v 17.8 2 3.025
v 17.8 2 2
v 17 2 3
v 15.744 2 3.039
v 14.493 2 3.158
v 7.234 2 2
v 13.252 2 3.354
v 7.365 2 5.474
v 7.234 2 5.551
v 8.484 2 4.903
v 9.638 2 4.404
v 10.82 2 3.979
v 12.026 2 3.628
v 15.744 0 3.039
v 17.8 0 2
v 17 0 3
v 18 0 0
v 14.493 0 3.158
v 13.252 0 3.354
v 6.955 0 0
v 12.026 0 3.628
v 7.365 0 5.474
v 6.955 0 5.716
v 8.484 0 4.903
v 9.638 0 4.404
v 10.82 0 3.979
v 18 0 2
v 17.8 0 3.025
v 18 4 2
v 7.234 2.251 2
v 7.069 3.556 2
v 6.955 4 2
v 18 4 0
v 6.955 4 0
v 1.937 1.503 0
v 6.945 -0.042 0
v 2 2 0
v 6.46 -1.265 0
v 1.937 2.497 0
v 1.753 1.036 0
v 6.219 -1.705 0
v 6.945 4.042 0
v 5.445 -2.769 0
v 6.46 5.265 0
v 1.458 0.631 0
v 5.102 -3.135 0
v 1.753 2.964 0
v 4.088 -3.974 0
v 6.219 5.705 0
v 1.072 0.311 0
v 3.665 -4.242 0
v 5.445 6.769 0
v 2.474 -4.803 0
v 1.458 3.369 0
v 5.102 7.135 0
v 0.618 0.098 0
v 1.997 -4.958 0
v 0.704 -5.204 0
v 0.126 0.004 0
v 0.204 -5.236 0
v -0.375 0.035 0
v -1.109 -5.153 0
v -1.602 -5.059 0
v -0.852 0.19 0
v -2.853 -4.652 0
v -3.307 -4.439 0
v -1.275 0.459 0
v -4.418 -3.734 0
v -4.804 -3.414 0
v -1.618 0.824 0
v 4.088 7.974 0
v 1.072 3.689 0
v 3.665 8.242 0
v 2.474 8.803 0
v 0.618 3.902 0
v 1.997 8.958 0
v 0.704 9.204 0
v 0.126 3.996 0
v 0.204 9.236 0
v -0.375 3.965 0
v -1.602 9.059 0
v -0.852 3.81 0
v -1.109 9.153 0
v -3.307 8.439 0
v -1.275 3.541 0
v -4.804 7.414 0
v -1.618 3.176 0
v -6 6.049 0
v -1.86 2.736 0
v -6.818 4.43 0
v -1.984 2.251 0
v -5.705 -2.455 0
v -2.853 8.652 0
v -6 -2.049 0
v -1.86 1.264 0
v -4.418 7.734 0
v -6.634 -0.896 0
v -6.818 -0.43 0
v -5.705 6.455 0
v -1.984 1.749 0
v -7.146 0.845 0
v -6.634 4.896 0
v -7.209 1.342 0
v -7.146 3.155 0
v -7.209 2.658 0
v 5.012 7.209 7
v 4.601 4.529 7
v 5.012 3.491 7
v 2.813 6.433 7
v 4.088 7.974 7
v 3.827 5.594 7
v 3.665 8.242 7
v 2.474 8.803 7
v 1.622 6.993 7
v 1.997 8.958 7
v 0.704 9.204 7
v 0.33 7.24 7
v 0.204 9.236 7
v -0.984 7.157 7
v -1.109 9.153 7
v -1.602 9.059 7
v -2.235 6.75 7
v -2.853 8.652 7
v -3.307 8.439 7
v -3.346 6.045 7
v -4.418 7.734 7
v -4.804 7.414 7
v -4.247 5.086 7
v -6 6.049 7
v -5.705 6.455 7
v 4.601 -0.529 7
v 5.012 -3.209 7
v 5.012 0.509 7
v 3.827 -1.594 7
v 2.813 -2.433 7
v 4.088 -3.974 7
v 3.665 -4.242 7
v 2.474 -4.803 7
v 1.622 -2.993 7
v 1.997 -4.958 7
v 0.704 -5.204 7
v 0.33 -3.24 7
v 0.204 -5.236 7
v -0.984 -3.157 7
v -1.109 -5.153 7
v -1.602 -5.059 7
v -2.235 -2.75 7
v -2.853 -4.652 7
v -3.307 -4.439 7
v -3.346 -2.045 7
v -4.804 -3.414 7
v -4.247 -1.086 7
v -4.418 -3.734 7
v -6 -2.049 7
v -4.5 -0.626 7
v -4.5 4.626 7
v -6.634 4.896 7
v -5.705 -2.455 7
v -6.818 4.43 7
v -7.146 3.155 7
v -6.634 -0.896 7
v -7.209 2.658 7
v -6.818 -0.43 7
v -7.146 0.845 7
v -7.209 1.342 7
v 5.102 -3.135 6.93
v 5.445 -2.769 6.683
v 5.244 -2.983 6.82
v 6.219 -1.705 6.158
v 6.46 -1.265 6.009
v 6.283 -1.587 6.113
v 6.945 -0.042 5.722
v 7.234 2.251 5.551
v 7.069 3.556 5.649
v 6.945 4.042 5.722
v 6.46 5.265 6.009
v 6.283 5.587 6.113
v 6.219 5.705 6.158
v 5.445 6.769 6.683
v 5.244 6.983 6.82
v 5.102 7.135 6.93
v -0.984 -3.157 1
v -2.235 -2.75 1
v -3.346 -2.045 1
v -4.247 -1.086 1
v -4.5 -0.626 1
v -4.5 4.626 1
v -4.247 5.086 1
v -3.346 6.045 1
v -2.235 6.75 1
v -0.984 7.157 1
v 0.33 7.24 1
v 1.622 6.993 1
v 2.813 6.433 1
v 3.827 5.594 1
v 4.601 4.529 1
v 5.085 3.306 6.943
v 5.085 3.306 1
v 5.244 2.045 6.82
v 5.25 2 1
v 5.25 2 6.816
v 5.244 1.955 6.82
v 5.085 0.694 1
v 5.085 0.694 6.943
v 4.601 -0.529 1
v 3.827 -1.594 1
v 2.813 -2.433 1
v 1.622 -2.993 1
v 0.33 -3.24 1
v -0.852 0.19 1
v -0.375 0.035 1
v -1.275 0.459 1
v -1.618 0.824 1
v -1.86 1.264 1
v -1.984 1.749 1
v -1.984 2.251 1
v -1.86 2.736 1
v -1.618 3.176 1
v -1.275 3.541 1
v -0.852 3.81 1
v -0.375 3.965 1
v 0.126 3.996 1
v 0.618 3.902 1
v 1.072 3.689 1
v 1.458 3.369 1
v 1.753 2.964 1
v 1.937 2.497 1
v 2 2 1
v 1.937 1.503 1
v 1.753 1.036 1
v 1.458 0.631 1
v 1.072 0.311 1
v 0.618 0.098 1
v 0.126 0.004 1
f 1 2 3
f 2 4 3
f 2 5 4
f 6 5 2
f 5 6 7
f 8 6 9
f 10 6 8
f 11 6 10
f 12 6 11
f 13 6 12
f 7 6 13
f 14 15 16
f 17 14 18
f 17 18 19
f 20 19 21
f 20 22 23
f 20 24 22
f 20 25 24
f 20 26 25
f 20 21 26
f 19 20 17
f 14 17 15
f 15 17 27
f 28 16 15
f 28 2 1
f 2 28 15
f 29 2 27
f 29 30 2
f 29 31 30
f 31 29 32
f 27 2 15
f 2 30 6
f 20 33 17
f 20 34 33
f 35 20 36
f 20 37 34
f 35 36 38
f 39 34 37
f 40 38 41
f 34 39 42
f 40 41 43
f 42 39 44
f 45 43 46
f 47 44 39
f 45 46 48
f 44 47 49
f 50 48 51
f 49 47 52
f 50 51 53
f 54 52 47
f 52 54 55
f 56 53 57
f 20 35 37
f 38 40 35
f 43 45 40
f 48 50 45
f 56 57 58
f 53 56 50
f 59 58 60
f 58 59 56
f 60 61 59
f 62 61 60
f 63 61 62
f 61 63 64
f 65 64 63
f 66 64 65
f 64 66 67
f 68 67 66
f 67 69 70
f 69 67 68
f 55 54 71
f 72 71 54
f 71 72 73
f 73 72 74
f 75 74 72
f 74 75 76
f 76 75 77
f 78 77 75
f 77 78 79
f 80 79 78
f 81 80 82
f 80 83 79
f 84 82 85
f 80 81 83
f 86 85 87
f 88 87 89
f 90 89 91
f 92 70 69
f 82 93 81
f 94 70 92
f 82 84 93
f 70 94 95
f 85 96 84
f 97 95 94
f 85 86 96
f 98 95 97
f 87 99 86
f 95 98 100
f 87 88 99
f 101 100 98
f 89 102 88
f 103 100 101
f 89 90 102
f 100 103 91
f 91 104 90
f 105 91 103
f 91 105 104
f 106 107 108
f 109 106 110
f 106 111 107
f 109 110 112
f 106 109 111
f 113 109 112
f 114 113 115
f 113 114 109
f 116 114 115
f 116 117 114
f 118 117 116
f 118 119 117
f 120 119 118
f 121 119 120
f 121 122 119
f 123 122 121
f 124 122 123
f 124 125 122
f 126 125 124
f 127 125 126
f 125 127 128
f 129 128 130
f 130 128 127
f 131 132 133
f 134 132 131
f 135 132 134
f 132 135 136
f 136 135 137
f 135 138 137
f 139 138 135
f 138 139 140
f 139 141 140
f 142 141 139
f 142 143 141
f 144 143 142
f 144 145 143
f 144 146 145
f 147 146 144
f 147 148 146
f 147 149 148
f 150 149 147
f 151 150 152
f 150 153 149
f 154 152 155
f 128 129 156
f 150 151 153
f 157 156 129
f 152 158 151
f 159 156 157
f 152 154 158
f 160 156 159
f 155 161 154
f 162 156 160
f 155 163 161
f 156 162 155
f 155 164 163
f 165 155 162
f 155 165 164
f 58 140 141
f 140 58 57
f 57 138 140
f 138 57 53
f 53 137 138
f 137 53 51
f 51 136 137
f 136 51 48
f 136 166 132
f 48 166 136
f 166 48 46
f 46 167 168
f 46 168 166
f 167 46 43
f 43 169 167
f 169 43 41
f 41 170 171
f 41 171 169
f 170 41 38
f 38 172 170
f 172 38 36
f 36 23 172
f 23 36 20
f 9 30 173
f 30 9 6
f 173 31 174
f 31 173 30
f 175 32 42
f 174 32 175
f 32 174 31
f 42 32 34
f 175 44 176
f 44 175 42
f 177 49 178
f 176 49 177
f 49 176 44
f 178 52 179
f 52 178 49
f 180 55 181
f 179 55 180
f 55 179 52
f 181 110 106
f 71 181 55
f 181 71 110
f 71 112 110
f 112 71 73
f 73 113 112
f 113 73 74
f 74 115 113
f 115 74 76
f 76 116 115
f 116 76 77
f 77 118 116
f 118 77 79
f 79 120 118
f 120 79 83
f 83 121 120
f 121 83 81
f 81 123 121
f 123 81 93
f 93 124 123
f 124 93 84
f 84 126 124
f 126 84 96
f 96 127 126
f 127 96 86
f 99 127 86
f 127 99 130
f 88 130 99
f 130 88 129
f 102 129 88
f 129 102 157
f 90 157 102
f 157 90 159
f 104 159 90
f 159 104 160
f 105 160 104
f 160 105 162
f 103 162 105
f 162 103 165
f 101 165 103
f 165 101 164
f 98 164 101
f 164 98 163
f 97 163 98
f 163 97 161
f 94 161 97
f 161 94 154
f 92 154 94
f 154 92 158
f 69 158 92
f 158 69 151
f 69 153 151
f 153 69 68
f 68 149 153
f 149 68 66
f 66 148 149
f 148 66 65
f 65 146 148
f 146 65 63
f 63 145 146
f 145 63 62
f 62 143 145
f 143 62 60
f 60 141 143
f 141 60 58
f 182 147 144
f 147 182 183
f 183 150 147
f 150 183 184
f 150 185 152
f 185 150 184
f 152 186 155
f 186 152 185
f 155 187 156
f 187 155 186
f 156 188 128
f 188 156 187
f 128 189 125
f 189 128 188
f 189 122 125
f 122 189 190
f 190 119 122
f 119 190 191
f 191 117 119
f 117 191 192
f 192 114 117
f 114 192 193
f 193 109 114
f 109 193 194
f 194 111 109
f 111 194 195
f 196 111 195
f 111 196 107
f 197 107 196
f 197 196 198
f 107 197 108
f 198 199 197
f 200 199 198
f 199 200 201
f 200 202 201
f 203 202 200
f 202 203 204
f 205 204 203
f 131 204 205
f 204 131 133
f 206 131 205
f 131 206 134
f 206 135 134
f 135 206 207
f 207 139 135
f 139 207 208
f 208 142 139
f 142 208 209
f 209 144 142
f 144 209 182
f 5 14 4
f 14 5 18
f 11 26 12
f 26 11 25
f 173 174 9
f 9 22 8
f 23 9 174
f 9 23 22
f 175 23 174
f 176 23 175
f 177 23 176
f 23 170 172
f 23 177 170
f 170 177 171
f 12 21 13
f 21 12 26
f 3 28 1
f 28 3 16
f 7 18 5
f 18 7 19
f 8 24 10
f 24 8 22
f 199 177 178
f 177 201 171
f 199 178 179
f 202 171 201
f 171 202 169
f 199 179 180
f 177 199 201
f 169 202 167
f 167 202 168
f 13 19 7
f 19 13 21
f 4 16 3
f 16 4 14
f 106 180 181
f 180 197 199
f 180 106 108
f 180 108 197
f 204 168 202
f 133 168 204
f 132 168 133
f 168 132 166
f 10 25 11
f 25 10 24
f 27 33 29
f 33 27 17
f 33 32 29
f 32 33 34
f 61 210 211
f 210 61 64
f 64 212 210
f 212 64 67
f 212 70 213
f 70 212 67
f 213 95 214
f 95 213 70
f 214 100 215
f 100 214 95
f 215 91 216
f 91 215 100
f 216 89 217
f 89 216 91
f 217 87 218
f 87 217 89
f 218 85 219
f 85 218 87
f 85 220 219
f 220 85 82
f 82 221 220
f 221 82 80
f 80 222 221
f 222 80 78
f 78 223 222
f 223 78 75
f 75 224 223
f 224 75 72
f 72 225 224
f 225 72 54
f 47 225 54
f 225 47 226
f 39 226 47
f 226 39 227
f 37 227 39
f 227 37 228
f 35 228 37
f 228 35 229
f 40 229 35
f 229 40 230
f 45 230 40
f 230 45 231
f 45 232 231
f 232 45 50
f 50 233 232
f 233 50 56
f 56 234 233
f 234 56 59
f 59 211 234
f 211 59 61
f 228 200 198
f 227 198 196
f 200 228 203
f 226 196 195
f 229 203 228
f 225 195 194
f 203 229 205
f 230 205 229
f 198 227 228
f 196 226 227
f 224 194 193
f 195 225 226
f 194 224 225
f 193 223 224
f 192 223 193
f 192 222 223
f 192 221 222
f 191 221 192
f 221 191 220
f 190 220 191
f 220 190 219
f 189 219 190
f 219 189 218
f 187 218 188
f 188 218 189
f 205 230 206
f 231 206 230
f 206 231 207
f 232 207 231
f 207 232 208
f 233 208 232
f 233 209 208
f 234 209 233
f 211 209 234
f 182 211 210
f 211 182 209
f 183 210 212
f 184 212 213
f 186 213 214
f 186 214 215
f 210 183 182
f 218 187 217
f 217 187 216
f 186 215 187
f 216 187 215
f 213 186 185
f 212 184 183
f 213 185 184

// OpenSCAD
foot_height = 20;
$fn = 25;
lengte=18;
breedte=4;
hoogte=10;
dikte=2;
hole=4;
wall = 2;
module outline() {
  difference() {
    offset(wall) children();
    offset(0) children();
  }
}

module onderkant(radius=2) {
  difference() {
    linear_extrude(height = dikte) {
      difference() {
        union() {
          square([lengte,breedte]);
          translate([0,breedte/2,0]) circle(d=11);
        }
        translate ([0,breedte/2,0]) circle(d=hole);
      }
    }
    translate ([0,breedte/2,dikte-1]) cylinder(d=10.5,h=20);
  }
}

module schoefgat() {
  linear_extrude(height=dikte+5) {
    translate ([-5.5,-2,0])  square([1,8]);
    color("blue") translate ([0,breedte/2,0])  outline() circle(d=10.5);
  }
}

module stulp() {
  translate([6.8,breedte/2,2])
    rotate([90,0,0]) { 
      linear_extrude (height=2) {
      //  difference() {
          square(11);
       //   translate([10,22.3,0]) circle(20, $fn=100);
       // }
      }
   }   
}
difference() {
    union(){
        stulp();
        schoefgat();
    }
 translate([17,10,23]) rotate([90,0,0]) cylinder(r=20,h=20, $fn=100);
}
onderkant();
